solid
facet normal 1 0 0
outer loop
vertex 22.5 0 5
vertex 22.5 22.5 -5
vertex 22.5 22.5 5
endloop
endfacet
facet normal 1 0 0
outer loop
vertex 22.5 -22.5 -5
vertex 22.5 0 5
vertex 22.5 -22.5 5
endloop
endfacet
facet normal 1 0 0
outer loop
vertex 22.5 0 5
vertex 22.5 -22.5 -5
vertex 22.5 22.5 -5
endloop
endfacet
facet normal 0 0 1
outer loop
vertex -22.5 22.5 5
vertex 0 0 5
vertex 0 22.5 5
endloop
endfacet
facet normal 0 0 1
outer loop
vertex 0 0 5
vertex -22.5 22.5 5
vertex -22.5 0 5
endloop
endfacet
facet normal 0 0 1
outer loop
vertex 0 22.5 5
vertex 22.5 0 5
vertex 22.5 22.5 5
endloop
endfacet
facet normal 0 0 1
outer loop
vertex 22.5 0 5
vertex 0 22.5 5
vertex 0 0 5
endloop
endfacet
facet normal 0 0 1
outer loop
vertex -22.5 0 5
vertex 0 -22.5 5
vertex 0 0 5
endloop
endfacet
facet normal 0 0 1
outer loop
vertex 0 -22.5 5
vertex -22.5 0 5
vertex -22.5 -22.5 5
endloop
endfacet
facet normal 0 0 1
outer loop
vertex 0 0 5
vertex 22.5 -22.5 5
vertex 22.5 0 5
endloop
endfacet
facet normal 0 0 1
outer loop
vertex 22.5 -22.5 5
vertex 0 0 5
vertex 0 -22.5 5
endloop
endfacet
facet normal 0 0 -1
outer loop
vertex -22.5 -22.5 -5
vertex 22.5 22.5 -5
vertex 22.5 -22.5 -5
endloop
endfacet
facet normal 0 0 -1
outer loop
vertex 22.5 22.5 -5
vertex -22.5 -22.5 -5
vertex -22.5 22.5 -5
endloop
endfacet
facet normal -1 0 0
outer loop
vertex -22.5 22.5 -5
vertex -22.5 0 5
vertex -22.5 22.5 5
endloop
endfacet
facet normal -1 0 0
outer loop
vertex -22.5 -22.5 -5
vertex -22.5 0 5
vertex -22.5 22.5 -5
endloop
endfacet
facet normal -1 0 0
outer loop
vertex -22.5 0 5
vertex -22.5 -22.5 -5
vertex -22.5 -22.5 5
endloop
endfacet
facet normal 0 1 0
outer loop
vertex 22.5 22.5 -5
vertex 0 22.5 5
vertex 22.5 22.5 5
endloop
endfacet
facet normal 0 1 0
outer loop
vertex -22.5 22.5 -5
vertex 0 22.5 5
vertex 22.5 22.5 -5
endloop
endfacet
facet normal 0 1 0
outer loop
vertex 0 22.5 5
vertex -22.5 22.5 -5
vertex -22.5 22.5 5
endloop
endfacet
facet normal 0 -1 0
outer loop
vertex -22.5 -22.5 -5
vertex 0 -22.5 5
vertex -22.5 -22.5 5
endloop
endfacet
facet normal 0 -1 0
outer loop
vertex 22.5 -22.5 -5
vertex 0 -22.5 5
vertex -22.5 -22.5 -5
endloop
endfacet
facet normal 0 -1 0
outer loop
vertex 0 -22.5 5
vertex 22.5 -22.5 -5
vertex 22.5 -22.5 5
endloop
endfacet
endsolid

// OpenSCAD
// file: ../../globals.scad
//$fa = $preview? 12 : 6;
//$fs = $preview? 2 : 0.2;

EPS = 1/64;

// Used for indexing coordinates since the dot syntax is not
// officialy supported
X = 0;
Y = 1;
Z = 2;

// Slicer defaults
LAYER_HEIGHT = 0.15;
EXTRUSION_WIDTH = 0.45;

function nearest_layer_height(n) = round(n / LAYER_HEIGHT) * LAYER_HEIGHT;
function nearest_extrusion_width(n) = round(n / EXTRUSION_WIDTH) * EXTRUSION_WIDTH;

// Defaults for all parts
WALL_XS = nearest_extrusion_width(1.25);
WALL_S = nearest_extrusion_width(2);
WALL = nearest_extrusion_width(3);
WALL_L = nearest_extrusion_width(5);
WALL_XL = nearest_extrusion_width(7.5);

// Seems to be a good middle ground, corresponds to #8 for imperial ones
SCREW = 4;

// Set up OpenSCAD rendering defaults
$fa = 6;
$fs = EXTRUSION_WIDTH / 2;

function default(v, d) = is_undef(v)? d : v;

// For engraving in all planes except those parrallel to XY.
module v_engrave(t, size=10) {
    translate([0, 0.3, 0])
    rotate([90,0,0])
    linear_extrude(0.3 + EPS)
    text(t, size=size, font="DejaVu Sans:style=Book", valign="center", halign="center", $fn=8);
}

// For engraving in all planes parrallel to XY.
module h_engrave(t, size=10) {
    translate([0, 0, -0.7])
    linear_extrude(0.7 + EPS)
    text(t, size=size, font="DejaVu Sans:style=Book", valign="center", halign="center", $fn=8);
}

// Used for creating screw holes
module screw(height, head_extra_height=0) {
    translate([0,0, -(height + head_extra_height) / 2]) {
        cylinder(height, r=SCREW/2);
        
        translate([0,0,height-SCREW/2])
        cylinder(SCREW/2, r1=SCREW/2, r2=SCREW);
        
        translate([0,0,height - EPS])
        cylinder(head_extra_height + EPS, r=SCREW);
    }
}
// main file
include <../../globals.scad>;

module block(
    size,
    left_fence=false,
    top_fence=false,
    right_fence=false,
    bottom_fence=false,
    annotation,
    fence_height=5,
    height=10
    )
{
    assert(len(size) == 2);

    module engrave() {
        text_width = min(min(size[X],size[Y]) - 2*WALL_XS, 0.5 * height * len(annotation));

        resize([text_width,0,0], auto=[true,false,true])
        v_engrave(annotation, size=0.7*height);  
    }
    
    fx = size[X] + (left_fence? WALL : 0) + (right_fence? WALL : 0);
    fy = size[Y] + (top_fence? WALL : 0) + (bottom_fence? WALL : 0);
    fz = height + fence_height;

    difference() {
        union() {
            cube([size[X], size[Y], height], center=true);

            if(top_fence) {
                translate([-size[X]/2 - (left_fence? WALL : 0), size[Y]/2, -height/2])
                cube([fx, WALL, fz]);
            }

            if(bottom_fence) {
                rotate(180)
                translate([-size[X]/2 - (right_fence? WALL : 0), size[Y]/2, -height/2])
                cube([fx, WALL, fz]);
            }

            if(right_fence) {
                translate([size[X]/2, -size[Y]/2, -height/2])
                cube([WALL, size[Y], fz]);
            }

            if(left_fence) {
                rotate(180)
                translate([size[X]/2, -size[Y]/2, -height/2])
                cube([WALL, size[Y], fz]);
            }
        }
        
        //center alignment notches in fence
        translate([0,0, height/2 + fence_height]) {
            rotate([0,45])
            cube([sqrt(2) * fence_height, size[Y] + 2*(WALL + EPS) ,sqrt(2) * fence_height], center=true);

            rotate([45,0])
            cube([size[X] + 2*(WALL + EPS), sqrt(2) * fence_height,sqrt(2) * fence_height], center=true);
        }
        
        if(annotation) {
            translate([0, -size[Y]/2 - (bottom_fence? WALL : 0), 0])
            engrave();
            
            rotate(180)
            translate([0, -size[Y]/2 - (top_fence? WALL : 0), 0])
            engrave();

            rotate(90)
            translate([0, -size[X]/2 - (right_fence? WALL : 0), 0])
            engrave();

            rotate(-90)
            translate([0, -size[X]/2 - (left_fence? WALL : 0), 0])
            engrave();
        }   
    }
}

block([45,45]);
